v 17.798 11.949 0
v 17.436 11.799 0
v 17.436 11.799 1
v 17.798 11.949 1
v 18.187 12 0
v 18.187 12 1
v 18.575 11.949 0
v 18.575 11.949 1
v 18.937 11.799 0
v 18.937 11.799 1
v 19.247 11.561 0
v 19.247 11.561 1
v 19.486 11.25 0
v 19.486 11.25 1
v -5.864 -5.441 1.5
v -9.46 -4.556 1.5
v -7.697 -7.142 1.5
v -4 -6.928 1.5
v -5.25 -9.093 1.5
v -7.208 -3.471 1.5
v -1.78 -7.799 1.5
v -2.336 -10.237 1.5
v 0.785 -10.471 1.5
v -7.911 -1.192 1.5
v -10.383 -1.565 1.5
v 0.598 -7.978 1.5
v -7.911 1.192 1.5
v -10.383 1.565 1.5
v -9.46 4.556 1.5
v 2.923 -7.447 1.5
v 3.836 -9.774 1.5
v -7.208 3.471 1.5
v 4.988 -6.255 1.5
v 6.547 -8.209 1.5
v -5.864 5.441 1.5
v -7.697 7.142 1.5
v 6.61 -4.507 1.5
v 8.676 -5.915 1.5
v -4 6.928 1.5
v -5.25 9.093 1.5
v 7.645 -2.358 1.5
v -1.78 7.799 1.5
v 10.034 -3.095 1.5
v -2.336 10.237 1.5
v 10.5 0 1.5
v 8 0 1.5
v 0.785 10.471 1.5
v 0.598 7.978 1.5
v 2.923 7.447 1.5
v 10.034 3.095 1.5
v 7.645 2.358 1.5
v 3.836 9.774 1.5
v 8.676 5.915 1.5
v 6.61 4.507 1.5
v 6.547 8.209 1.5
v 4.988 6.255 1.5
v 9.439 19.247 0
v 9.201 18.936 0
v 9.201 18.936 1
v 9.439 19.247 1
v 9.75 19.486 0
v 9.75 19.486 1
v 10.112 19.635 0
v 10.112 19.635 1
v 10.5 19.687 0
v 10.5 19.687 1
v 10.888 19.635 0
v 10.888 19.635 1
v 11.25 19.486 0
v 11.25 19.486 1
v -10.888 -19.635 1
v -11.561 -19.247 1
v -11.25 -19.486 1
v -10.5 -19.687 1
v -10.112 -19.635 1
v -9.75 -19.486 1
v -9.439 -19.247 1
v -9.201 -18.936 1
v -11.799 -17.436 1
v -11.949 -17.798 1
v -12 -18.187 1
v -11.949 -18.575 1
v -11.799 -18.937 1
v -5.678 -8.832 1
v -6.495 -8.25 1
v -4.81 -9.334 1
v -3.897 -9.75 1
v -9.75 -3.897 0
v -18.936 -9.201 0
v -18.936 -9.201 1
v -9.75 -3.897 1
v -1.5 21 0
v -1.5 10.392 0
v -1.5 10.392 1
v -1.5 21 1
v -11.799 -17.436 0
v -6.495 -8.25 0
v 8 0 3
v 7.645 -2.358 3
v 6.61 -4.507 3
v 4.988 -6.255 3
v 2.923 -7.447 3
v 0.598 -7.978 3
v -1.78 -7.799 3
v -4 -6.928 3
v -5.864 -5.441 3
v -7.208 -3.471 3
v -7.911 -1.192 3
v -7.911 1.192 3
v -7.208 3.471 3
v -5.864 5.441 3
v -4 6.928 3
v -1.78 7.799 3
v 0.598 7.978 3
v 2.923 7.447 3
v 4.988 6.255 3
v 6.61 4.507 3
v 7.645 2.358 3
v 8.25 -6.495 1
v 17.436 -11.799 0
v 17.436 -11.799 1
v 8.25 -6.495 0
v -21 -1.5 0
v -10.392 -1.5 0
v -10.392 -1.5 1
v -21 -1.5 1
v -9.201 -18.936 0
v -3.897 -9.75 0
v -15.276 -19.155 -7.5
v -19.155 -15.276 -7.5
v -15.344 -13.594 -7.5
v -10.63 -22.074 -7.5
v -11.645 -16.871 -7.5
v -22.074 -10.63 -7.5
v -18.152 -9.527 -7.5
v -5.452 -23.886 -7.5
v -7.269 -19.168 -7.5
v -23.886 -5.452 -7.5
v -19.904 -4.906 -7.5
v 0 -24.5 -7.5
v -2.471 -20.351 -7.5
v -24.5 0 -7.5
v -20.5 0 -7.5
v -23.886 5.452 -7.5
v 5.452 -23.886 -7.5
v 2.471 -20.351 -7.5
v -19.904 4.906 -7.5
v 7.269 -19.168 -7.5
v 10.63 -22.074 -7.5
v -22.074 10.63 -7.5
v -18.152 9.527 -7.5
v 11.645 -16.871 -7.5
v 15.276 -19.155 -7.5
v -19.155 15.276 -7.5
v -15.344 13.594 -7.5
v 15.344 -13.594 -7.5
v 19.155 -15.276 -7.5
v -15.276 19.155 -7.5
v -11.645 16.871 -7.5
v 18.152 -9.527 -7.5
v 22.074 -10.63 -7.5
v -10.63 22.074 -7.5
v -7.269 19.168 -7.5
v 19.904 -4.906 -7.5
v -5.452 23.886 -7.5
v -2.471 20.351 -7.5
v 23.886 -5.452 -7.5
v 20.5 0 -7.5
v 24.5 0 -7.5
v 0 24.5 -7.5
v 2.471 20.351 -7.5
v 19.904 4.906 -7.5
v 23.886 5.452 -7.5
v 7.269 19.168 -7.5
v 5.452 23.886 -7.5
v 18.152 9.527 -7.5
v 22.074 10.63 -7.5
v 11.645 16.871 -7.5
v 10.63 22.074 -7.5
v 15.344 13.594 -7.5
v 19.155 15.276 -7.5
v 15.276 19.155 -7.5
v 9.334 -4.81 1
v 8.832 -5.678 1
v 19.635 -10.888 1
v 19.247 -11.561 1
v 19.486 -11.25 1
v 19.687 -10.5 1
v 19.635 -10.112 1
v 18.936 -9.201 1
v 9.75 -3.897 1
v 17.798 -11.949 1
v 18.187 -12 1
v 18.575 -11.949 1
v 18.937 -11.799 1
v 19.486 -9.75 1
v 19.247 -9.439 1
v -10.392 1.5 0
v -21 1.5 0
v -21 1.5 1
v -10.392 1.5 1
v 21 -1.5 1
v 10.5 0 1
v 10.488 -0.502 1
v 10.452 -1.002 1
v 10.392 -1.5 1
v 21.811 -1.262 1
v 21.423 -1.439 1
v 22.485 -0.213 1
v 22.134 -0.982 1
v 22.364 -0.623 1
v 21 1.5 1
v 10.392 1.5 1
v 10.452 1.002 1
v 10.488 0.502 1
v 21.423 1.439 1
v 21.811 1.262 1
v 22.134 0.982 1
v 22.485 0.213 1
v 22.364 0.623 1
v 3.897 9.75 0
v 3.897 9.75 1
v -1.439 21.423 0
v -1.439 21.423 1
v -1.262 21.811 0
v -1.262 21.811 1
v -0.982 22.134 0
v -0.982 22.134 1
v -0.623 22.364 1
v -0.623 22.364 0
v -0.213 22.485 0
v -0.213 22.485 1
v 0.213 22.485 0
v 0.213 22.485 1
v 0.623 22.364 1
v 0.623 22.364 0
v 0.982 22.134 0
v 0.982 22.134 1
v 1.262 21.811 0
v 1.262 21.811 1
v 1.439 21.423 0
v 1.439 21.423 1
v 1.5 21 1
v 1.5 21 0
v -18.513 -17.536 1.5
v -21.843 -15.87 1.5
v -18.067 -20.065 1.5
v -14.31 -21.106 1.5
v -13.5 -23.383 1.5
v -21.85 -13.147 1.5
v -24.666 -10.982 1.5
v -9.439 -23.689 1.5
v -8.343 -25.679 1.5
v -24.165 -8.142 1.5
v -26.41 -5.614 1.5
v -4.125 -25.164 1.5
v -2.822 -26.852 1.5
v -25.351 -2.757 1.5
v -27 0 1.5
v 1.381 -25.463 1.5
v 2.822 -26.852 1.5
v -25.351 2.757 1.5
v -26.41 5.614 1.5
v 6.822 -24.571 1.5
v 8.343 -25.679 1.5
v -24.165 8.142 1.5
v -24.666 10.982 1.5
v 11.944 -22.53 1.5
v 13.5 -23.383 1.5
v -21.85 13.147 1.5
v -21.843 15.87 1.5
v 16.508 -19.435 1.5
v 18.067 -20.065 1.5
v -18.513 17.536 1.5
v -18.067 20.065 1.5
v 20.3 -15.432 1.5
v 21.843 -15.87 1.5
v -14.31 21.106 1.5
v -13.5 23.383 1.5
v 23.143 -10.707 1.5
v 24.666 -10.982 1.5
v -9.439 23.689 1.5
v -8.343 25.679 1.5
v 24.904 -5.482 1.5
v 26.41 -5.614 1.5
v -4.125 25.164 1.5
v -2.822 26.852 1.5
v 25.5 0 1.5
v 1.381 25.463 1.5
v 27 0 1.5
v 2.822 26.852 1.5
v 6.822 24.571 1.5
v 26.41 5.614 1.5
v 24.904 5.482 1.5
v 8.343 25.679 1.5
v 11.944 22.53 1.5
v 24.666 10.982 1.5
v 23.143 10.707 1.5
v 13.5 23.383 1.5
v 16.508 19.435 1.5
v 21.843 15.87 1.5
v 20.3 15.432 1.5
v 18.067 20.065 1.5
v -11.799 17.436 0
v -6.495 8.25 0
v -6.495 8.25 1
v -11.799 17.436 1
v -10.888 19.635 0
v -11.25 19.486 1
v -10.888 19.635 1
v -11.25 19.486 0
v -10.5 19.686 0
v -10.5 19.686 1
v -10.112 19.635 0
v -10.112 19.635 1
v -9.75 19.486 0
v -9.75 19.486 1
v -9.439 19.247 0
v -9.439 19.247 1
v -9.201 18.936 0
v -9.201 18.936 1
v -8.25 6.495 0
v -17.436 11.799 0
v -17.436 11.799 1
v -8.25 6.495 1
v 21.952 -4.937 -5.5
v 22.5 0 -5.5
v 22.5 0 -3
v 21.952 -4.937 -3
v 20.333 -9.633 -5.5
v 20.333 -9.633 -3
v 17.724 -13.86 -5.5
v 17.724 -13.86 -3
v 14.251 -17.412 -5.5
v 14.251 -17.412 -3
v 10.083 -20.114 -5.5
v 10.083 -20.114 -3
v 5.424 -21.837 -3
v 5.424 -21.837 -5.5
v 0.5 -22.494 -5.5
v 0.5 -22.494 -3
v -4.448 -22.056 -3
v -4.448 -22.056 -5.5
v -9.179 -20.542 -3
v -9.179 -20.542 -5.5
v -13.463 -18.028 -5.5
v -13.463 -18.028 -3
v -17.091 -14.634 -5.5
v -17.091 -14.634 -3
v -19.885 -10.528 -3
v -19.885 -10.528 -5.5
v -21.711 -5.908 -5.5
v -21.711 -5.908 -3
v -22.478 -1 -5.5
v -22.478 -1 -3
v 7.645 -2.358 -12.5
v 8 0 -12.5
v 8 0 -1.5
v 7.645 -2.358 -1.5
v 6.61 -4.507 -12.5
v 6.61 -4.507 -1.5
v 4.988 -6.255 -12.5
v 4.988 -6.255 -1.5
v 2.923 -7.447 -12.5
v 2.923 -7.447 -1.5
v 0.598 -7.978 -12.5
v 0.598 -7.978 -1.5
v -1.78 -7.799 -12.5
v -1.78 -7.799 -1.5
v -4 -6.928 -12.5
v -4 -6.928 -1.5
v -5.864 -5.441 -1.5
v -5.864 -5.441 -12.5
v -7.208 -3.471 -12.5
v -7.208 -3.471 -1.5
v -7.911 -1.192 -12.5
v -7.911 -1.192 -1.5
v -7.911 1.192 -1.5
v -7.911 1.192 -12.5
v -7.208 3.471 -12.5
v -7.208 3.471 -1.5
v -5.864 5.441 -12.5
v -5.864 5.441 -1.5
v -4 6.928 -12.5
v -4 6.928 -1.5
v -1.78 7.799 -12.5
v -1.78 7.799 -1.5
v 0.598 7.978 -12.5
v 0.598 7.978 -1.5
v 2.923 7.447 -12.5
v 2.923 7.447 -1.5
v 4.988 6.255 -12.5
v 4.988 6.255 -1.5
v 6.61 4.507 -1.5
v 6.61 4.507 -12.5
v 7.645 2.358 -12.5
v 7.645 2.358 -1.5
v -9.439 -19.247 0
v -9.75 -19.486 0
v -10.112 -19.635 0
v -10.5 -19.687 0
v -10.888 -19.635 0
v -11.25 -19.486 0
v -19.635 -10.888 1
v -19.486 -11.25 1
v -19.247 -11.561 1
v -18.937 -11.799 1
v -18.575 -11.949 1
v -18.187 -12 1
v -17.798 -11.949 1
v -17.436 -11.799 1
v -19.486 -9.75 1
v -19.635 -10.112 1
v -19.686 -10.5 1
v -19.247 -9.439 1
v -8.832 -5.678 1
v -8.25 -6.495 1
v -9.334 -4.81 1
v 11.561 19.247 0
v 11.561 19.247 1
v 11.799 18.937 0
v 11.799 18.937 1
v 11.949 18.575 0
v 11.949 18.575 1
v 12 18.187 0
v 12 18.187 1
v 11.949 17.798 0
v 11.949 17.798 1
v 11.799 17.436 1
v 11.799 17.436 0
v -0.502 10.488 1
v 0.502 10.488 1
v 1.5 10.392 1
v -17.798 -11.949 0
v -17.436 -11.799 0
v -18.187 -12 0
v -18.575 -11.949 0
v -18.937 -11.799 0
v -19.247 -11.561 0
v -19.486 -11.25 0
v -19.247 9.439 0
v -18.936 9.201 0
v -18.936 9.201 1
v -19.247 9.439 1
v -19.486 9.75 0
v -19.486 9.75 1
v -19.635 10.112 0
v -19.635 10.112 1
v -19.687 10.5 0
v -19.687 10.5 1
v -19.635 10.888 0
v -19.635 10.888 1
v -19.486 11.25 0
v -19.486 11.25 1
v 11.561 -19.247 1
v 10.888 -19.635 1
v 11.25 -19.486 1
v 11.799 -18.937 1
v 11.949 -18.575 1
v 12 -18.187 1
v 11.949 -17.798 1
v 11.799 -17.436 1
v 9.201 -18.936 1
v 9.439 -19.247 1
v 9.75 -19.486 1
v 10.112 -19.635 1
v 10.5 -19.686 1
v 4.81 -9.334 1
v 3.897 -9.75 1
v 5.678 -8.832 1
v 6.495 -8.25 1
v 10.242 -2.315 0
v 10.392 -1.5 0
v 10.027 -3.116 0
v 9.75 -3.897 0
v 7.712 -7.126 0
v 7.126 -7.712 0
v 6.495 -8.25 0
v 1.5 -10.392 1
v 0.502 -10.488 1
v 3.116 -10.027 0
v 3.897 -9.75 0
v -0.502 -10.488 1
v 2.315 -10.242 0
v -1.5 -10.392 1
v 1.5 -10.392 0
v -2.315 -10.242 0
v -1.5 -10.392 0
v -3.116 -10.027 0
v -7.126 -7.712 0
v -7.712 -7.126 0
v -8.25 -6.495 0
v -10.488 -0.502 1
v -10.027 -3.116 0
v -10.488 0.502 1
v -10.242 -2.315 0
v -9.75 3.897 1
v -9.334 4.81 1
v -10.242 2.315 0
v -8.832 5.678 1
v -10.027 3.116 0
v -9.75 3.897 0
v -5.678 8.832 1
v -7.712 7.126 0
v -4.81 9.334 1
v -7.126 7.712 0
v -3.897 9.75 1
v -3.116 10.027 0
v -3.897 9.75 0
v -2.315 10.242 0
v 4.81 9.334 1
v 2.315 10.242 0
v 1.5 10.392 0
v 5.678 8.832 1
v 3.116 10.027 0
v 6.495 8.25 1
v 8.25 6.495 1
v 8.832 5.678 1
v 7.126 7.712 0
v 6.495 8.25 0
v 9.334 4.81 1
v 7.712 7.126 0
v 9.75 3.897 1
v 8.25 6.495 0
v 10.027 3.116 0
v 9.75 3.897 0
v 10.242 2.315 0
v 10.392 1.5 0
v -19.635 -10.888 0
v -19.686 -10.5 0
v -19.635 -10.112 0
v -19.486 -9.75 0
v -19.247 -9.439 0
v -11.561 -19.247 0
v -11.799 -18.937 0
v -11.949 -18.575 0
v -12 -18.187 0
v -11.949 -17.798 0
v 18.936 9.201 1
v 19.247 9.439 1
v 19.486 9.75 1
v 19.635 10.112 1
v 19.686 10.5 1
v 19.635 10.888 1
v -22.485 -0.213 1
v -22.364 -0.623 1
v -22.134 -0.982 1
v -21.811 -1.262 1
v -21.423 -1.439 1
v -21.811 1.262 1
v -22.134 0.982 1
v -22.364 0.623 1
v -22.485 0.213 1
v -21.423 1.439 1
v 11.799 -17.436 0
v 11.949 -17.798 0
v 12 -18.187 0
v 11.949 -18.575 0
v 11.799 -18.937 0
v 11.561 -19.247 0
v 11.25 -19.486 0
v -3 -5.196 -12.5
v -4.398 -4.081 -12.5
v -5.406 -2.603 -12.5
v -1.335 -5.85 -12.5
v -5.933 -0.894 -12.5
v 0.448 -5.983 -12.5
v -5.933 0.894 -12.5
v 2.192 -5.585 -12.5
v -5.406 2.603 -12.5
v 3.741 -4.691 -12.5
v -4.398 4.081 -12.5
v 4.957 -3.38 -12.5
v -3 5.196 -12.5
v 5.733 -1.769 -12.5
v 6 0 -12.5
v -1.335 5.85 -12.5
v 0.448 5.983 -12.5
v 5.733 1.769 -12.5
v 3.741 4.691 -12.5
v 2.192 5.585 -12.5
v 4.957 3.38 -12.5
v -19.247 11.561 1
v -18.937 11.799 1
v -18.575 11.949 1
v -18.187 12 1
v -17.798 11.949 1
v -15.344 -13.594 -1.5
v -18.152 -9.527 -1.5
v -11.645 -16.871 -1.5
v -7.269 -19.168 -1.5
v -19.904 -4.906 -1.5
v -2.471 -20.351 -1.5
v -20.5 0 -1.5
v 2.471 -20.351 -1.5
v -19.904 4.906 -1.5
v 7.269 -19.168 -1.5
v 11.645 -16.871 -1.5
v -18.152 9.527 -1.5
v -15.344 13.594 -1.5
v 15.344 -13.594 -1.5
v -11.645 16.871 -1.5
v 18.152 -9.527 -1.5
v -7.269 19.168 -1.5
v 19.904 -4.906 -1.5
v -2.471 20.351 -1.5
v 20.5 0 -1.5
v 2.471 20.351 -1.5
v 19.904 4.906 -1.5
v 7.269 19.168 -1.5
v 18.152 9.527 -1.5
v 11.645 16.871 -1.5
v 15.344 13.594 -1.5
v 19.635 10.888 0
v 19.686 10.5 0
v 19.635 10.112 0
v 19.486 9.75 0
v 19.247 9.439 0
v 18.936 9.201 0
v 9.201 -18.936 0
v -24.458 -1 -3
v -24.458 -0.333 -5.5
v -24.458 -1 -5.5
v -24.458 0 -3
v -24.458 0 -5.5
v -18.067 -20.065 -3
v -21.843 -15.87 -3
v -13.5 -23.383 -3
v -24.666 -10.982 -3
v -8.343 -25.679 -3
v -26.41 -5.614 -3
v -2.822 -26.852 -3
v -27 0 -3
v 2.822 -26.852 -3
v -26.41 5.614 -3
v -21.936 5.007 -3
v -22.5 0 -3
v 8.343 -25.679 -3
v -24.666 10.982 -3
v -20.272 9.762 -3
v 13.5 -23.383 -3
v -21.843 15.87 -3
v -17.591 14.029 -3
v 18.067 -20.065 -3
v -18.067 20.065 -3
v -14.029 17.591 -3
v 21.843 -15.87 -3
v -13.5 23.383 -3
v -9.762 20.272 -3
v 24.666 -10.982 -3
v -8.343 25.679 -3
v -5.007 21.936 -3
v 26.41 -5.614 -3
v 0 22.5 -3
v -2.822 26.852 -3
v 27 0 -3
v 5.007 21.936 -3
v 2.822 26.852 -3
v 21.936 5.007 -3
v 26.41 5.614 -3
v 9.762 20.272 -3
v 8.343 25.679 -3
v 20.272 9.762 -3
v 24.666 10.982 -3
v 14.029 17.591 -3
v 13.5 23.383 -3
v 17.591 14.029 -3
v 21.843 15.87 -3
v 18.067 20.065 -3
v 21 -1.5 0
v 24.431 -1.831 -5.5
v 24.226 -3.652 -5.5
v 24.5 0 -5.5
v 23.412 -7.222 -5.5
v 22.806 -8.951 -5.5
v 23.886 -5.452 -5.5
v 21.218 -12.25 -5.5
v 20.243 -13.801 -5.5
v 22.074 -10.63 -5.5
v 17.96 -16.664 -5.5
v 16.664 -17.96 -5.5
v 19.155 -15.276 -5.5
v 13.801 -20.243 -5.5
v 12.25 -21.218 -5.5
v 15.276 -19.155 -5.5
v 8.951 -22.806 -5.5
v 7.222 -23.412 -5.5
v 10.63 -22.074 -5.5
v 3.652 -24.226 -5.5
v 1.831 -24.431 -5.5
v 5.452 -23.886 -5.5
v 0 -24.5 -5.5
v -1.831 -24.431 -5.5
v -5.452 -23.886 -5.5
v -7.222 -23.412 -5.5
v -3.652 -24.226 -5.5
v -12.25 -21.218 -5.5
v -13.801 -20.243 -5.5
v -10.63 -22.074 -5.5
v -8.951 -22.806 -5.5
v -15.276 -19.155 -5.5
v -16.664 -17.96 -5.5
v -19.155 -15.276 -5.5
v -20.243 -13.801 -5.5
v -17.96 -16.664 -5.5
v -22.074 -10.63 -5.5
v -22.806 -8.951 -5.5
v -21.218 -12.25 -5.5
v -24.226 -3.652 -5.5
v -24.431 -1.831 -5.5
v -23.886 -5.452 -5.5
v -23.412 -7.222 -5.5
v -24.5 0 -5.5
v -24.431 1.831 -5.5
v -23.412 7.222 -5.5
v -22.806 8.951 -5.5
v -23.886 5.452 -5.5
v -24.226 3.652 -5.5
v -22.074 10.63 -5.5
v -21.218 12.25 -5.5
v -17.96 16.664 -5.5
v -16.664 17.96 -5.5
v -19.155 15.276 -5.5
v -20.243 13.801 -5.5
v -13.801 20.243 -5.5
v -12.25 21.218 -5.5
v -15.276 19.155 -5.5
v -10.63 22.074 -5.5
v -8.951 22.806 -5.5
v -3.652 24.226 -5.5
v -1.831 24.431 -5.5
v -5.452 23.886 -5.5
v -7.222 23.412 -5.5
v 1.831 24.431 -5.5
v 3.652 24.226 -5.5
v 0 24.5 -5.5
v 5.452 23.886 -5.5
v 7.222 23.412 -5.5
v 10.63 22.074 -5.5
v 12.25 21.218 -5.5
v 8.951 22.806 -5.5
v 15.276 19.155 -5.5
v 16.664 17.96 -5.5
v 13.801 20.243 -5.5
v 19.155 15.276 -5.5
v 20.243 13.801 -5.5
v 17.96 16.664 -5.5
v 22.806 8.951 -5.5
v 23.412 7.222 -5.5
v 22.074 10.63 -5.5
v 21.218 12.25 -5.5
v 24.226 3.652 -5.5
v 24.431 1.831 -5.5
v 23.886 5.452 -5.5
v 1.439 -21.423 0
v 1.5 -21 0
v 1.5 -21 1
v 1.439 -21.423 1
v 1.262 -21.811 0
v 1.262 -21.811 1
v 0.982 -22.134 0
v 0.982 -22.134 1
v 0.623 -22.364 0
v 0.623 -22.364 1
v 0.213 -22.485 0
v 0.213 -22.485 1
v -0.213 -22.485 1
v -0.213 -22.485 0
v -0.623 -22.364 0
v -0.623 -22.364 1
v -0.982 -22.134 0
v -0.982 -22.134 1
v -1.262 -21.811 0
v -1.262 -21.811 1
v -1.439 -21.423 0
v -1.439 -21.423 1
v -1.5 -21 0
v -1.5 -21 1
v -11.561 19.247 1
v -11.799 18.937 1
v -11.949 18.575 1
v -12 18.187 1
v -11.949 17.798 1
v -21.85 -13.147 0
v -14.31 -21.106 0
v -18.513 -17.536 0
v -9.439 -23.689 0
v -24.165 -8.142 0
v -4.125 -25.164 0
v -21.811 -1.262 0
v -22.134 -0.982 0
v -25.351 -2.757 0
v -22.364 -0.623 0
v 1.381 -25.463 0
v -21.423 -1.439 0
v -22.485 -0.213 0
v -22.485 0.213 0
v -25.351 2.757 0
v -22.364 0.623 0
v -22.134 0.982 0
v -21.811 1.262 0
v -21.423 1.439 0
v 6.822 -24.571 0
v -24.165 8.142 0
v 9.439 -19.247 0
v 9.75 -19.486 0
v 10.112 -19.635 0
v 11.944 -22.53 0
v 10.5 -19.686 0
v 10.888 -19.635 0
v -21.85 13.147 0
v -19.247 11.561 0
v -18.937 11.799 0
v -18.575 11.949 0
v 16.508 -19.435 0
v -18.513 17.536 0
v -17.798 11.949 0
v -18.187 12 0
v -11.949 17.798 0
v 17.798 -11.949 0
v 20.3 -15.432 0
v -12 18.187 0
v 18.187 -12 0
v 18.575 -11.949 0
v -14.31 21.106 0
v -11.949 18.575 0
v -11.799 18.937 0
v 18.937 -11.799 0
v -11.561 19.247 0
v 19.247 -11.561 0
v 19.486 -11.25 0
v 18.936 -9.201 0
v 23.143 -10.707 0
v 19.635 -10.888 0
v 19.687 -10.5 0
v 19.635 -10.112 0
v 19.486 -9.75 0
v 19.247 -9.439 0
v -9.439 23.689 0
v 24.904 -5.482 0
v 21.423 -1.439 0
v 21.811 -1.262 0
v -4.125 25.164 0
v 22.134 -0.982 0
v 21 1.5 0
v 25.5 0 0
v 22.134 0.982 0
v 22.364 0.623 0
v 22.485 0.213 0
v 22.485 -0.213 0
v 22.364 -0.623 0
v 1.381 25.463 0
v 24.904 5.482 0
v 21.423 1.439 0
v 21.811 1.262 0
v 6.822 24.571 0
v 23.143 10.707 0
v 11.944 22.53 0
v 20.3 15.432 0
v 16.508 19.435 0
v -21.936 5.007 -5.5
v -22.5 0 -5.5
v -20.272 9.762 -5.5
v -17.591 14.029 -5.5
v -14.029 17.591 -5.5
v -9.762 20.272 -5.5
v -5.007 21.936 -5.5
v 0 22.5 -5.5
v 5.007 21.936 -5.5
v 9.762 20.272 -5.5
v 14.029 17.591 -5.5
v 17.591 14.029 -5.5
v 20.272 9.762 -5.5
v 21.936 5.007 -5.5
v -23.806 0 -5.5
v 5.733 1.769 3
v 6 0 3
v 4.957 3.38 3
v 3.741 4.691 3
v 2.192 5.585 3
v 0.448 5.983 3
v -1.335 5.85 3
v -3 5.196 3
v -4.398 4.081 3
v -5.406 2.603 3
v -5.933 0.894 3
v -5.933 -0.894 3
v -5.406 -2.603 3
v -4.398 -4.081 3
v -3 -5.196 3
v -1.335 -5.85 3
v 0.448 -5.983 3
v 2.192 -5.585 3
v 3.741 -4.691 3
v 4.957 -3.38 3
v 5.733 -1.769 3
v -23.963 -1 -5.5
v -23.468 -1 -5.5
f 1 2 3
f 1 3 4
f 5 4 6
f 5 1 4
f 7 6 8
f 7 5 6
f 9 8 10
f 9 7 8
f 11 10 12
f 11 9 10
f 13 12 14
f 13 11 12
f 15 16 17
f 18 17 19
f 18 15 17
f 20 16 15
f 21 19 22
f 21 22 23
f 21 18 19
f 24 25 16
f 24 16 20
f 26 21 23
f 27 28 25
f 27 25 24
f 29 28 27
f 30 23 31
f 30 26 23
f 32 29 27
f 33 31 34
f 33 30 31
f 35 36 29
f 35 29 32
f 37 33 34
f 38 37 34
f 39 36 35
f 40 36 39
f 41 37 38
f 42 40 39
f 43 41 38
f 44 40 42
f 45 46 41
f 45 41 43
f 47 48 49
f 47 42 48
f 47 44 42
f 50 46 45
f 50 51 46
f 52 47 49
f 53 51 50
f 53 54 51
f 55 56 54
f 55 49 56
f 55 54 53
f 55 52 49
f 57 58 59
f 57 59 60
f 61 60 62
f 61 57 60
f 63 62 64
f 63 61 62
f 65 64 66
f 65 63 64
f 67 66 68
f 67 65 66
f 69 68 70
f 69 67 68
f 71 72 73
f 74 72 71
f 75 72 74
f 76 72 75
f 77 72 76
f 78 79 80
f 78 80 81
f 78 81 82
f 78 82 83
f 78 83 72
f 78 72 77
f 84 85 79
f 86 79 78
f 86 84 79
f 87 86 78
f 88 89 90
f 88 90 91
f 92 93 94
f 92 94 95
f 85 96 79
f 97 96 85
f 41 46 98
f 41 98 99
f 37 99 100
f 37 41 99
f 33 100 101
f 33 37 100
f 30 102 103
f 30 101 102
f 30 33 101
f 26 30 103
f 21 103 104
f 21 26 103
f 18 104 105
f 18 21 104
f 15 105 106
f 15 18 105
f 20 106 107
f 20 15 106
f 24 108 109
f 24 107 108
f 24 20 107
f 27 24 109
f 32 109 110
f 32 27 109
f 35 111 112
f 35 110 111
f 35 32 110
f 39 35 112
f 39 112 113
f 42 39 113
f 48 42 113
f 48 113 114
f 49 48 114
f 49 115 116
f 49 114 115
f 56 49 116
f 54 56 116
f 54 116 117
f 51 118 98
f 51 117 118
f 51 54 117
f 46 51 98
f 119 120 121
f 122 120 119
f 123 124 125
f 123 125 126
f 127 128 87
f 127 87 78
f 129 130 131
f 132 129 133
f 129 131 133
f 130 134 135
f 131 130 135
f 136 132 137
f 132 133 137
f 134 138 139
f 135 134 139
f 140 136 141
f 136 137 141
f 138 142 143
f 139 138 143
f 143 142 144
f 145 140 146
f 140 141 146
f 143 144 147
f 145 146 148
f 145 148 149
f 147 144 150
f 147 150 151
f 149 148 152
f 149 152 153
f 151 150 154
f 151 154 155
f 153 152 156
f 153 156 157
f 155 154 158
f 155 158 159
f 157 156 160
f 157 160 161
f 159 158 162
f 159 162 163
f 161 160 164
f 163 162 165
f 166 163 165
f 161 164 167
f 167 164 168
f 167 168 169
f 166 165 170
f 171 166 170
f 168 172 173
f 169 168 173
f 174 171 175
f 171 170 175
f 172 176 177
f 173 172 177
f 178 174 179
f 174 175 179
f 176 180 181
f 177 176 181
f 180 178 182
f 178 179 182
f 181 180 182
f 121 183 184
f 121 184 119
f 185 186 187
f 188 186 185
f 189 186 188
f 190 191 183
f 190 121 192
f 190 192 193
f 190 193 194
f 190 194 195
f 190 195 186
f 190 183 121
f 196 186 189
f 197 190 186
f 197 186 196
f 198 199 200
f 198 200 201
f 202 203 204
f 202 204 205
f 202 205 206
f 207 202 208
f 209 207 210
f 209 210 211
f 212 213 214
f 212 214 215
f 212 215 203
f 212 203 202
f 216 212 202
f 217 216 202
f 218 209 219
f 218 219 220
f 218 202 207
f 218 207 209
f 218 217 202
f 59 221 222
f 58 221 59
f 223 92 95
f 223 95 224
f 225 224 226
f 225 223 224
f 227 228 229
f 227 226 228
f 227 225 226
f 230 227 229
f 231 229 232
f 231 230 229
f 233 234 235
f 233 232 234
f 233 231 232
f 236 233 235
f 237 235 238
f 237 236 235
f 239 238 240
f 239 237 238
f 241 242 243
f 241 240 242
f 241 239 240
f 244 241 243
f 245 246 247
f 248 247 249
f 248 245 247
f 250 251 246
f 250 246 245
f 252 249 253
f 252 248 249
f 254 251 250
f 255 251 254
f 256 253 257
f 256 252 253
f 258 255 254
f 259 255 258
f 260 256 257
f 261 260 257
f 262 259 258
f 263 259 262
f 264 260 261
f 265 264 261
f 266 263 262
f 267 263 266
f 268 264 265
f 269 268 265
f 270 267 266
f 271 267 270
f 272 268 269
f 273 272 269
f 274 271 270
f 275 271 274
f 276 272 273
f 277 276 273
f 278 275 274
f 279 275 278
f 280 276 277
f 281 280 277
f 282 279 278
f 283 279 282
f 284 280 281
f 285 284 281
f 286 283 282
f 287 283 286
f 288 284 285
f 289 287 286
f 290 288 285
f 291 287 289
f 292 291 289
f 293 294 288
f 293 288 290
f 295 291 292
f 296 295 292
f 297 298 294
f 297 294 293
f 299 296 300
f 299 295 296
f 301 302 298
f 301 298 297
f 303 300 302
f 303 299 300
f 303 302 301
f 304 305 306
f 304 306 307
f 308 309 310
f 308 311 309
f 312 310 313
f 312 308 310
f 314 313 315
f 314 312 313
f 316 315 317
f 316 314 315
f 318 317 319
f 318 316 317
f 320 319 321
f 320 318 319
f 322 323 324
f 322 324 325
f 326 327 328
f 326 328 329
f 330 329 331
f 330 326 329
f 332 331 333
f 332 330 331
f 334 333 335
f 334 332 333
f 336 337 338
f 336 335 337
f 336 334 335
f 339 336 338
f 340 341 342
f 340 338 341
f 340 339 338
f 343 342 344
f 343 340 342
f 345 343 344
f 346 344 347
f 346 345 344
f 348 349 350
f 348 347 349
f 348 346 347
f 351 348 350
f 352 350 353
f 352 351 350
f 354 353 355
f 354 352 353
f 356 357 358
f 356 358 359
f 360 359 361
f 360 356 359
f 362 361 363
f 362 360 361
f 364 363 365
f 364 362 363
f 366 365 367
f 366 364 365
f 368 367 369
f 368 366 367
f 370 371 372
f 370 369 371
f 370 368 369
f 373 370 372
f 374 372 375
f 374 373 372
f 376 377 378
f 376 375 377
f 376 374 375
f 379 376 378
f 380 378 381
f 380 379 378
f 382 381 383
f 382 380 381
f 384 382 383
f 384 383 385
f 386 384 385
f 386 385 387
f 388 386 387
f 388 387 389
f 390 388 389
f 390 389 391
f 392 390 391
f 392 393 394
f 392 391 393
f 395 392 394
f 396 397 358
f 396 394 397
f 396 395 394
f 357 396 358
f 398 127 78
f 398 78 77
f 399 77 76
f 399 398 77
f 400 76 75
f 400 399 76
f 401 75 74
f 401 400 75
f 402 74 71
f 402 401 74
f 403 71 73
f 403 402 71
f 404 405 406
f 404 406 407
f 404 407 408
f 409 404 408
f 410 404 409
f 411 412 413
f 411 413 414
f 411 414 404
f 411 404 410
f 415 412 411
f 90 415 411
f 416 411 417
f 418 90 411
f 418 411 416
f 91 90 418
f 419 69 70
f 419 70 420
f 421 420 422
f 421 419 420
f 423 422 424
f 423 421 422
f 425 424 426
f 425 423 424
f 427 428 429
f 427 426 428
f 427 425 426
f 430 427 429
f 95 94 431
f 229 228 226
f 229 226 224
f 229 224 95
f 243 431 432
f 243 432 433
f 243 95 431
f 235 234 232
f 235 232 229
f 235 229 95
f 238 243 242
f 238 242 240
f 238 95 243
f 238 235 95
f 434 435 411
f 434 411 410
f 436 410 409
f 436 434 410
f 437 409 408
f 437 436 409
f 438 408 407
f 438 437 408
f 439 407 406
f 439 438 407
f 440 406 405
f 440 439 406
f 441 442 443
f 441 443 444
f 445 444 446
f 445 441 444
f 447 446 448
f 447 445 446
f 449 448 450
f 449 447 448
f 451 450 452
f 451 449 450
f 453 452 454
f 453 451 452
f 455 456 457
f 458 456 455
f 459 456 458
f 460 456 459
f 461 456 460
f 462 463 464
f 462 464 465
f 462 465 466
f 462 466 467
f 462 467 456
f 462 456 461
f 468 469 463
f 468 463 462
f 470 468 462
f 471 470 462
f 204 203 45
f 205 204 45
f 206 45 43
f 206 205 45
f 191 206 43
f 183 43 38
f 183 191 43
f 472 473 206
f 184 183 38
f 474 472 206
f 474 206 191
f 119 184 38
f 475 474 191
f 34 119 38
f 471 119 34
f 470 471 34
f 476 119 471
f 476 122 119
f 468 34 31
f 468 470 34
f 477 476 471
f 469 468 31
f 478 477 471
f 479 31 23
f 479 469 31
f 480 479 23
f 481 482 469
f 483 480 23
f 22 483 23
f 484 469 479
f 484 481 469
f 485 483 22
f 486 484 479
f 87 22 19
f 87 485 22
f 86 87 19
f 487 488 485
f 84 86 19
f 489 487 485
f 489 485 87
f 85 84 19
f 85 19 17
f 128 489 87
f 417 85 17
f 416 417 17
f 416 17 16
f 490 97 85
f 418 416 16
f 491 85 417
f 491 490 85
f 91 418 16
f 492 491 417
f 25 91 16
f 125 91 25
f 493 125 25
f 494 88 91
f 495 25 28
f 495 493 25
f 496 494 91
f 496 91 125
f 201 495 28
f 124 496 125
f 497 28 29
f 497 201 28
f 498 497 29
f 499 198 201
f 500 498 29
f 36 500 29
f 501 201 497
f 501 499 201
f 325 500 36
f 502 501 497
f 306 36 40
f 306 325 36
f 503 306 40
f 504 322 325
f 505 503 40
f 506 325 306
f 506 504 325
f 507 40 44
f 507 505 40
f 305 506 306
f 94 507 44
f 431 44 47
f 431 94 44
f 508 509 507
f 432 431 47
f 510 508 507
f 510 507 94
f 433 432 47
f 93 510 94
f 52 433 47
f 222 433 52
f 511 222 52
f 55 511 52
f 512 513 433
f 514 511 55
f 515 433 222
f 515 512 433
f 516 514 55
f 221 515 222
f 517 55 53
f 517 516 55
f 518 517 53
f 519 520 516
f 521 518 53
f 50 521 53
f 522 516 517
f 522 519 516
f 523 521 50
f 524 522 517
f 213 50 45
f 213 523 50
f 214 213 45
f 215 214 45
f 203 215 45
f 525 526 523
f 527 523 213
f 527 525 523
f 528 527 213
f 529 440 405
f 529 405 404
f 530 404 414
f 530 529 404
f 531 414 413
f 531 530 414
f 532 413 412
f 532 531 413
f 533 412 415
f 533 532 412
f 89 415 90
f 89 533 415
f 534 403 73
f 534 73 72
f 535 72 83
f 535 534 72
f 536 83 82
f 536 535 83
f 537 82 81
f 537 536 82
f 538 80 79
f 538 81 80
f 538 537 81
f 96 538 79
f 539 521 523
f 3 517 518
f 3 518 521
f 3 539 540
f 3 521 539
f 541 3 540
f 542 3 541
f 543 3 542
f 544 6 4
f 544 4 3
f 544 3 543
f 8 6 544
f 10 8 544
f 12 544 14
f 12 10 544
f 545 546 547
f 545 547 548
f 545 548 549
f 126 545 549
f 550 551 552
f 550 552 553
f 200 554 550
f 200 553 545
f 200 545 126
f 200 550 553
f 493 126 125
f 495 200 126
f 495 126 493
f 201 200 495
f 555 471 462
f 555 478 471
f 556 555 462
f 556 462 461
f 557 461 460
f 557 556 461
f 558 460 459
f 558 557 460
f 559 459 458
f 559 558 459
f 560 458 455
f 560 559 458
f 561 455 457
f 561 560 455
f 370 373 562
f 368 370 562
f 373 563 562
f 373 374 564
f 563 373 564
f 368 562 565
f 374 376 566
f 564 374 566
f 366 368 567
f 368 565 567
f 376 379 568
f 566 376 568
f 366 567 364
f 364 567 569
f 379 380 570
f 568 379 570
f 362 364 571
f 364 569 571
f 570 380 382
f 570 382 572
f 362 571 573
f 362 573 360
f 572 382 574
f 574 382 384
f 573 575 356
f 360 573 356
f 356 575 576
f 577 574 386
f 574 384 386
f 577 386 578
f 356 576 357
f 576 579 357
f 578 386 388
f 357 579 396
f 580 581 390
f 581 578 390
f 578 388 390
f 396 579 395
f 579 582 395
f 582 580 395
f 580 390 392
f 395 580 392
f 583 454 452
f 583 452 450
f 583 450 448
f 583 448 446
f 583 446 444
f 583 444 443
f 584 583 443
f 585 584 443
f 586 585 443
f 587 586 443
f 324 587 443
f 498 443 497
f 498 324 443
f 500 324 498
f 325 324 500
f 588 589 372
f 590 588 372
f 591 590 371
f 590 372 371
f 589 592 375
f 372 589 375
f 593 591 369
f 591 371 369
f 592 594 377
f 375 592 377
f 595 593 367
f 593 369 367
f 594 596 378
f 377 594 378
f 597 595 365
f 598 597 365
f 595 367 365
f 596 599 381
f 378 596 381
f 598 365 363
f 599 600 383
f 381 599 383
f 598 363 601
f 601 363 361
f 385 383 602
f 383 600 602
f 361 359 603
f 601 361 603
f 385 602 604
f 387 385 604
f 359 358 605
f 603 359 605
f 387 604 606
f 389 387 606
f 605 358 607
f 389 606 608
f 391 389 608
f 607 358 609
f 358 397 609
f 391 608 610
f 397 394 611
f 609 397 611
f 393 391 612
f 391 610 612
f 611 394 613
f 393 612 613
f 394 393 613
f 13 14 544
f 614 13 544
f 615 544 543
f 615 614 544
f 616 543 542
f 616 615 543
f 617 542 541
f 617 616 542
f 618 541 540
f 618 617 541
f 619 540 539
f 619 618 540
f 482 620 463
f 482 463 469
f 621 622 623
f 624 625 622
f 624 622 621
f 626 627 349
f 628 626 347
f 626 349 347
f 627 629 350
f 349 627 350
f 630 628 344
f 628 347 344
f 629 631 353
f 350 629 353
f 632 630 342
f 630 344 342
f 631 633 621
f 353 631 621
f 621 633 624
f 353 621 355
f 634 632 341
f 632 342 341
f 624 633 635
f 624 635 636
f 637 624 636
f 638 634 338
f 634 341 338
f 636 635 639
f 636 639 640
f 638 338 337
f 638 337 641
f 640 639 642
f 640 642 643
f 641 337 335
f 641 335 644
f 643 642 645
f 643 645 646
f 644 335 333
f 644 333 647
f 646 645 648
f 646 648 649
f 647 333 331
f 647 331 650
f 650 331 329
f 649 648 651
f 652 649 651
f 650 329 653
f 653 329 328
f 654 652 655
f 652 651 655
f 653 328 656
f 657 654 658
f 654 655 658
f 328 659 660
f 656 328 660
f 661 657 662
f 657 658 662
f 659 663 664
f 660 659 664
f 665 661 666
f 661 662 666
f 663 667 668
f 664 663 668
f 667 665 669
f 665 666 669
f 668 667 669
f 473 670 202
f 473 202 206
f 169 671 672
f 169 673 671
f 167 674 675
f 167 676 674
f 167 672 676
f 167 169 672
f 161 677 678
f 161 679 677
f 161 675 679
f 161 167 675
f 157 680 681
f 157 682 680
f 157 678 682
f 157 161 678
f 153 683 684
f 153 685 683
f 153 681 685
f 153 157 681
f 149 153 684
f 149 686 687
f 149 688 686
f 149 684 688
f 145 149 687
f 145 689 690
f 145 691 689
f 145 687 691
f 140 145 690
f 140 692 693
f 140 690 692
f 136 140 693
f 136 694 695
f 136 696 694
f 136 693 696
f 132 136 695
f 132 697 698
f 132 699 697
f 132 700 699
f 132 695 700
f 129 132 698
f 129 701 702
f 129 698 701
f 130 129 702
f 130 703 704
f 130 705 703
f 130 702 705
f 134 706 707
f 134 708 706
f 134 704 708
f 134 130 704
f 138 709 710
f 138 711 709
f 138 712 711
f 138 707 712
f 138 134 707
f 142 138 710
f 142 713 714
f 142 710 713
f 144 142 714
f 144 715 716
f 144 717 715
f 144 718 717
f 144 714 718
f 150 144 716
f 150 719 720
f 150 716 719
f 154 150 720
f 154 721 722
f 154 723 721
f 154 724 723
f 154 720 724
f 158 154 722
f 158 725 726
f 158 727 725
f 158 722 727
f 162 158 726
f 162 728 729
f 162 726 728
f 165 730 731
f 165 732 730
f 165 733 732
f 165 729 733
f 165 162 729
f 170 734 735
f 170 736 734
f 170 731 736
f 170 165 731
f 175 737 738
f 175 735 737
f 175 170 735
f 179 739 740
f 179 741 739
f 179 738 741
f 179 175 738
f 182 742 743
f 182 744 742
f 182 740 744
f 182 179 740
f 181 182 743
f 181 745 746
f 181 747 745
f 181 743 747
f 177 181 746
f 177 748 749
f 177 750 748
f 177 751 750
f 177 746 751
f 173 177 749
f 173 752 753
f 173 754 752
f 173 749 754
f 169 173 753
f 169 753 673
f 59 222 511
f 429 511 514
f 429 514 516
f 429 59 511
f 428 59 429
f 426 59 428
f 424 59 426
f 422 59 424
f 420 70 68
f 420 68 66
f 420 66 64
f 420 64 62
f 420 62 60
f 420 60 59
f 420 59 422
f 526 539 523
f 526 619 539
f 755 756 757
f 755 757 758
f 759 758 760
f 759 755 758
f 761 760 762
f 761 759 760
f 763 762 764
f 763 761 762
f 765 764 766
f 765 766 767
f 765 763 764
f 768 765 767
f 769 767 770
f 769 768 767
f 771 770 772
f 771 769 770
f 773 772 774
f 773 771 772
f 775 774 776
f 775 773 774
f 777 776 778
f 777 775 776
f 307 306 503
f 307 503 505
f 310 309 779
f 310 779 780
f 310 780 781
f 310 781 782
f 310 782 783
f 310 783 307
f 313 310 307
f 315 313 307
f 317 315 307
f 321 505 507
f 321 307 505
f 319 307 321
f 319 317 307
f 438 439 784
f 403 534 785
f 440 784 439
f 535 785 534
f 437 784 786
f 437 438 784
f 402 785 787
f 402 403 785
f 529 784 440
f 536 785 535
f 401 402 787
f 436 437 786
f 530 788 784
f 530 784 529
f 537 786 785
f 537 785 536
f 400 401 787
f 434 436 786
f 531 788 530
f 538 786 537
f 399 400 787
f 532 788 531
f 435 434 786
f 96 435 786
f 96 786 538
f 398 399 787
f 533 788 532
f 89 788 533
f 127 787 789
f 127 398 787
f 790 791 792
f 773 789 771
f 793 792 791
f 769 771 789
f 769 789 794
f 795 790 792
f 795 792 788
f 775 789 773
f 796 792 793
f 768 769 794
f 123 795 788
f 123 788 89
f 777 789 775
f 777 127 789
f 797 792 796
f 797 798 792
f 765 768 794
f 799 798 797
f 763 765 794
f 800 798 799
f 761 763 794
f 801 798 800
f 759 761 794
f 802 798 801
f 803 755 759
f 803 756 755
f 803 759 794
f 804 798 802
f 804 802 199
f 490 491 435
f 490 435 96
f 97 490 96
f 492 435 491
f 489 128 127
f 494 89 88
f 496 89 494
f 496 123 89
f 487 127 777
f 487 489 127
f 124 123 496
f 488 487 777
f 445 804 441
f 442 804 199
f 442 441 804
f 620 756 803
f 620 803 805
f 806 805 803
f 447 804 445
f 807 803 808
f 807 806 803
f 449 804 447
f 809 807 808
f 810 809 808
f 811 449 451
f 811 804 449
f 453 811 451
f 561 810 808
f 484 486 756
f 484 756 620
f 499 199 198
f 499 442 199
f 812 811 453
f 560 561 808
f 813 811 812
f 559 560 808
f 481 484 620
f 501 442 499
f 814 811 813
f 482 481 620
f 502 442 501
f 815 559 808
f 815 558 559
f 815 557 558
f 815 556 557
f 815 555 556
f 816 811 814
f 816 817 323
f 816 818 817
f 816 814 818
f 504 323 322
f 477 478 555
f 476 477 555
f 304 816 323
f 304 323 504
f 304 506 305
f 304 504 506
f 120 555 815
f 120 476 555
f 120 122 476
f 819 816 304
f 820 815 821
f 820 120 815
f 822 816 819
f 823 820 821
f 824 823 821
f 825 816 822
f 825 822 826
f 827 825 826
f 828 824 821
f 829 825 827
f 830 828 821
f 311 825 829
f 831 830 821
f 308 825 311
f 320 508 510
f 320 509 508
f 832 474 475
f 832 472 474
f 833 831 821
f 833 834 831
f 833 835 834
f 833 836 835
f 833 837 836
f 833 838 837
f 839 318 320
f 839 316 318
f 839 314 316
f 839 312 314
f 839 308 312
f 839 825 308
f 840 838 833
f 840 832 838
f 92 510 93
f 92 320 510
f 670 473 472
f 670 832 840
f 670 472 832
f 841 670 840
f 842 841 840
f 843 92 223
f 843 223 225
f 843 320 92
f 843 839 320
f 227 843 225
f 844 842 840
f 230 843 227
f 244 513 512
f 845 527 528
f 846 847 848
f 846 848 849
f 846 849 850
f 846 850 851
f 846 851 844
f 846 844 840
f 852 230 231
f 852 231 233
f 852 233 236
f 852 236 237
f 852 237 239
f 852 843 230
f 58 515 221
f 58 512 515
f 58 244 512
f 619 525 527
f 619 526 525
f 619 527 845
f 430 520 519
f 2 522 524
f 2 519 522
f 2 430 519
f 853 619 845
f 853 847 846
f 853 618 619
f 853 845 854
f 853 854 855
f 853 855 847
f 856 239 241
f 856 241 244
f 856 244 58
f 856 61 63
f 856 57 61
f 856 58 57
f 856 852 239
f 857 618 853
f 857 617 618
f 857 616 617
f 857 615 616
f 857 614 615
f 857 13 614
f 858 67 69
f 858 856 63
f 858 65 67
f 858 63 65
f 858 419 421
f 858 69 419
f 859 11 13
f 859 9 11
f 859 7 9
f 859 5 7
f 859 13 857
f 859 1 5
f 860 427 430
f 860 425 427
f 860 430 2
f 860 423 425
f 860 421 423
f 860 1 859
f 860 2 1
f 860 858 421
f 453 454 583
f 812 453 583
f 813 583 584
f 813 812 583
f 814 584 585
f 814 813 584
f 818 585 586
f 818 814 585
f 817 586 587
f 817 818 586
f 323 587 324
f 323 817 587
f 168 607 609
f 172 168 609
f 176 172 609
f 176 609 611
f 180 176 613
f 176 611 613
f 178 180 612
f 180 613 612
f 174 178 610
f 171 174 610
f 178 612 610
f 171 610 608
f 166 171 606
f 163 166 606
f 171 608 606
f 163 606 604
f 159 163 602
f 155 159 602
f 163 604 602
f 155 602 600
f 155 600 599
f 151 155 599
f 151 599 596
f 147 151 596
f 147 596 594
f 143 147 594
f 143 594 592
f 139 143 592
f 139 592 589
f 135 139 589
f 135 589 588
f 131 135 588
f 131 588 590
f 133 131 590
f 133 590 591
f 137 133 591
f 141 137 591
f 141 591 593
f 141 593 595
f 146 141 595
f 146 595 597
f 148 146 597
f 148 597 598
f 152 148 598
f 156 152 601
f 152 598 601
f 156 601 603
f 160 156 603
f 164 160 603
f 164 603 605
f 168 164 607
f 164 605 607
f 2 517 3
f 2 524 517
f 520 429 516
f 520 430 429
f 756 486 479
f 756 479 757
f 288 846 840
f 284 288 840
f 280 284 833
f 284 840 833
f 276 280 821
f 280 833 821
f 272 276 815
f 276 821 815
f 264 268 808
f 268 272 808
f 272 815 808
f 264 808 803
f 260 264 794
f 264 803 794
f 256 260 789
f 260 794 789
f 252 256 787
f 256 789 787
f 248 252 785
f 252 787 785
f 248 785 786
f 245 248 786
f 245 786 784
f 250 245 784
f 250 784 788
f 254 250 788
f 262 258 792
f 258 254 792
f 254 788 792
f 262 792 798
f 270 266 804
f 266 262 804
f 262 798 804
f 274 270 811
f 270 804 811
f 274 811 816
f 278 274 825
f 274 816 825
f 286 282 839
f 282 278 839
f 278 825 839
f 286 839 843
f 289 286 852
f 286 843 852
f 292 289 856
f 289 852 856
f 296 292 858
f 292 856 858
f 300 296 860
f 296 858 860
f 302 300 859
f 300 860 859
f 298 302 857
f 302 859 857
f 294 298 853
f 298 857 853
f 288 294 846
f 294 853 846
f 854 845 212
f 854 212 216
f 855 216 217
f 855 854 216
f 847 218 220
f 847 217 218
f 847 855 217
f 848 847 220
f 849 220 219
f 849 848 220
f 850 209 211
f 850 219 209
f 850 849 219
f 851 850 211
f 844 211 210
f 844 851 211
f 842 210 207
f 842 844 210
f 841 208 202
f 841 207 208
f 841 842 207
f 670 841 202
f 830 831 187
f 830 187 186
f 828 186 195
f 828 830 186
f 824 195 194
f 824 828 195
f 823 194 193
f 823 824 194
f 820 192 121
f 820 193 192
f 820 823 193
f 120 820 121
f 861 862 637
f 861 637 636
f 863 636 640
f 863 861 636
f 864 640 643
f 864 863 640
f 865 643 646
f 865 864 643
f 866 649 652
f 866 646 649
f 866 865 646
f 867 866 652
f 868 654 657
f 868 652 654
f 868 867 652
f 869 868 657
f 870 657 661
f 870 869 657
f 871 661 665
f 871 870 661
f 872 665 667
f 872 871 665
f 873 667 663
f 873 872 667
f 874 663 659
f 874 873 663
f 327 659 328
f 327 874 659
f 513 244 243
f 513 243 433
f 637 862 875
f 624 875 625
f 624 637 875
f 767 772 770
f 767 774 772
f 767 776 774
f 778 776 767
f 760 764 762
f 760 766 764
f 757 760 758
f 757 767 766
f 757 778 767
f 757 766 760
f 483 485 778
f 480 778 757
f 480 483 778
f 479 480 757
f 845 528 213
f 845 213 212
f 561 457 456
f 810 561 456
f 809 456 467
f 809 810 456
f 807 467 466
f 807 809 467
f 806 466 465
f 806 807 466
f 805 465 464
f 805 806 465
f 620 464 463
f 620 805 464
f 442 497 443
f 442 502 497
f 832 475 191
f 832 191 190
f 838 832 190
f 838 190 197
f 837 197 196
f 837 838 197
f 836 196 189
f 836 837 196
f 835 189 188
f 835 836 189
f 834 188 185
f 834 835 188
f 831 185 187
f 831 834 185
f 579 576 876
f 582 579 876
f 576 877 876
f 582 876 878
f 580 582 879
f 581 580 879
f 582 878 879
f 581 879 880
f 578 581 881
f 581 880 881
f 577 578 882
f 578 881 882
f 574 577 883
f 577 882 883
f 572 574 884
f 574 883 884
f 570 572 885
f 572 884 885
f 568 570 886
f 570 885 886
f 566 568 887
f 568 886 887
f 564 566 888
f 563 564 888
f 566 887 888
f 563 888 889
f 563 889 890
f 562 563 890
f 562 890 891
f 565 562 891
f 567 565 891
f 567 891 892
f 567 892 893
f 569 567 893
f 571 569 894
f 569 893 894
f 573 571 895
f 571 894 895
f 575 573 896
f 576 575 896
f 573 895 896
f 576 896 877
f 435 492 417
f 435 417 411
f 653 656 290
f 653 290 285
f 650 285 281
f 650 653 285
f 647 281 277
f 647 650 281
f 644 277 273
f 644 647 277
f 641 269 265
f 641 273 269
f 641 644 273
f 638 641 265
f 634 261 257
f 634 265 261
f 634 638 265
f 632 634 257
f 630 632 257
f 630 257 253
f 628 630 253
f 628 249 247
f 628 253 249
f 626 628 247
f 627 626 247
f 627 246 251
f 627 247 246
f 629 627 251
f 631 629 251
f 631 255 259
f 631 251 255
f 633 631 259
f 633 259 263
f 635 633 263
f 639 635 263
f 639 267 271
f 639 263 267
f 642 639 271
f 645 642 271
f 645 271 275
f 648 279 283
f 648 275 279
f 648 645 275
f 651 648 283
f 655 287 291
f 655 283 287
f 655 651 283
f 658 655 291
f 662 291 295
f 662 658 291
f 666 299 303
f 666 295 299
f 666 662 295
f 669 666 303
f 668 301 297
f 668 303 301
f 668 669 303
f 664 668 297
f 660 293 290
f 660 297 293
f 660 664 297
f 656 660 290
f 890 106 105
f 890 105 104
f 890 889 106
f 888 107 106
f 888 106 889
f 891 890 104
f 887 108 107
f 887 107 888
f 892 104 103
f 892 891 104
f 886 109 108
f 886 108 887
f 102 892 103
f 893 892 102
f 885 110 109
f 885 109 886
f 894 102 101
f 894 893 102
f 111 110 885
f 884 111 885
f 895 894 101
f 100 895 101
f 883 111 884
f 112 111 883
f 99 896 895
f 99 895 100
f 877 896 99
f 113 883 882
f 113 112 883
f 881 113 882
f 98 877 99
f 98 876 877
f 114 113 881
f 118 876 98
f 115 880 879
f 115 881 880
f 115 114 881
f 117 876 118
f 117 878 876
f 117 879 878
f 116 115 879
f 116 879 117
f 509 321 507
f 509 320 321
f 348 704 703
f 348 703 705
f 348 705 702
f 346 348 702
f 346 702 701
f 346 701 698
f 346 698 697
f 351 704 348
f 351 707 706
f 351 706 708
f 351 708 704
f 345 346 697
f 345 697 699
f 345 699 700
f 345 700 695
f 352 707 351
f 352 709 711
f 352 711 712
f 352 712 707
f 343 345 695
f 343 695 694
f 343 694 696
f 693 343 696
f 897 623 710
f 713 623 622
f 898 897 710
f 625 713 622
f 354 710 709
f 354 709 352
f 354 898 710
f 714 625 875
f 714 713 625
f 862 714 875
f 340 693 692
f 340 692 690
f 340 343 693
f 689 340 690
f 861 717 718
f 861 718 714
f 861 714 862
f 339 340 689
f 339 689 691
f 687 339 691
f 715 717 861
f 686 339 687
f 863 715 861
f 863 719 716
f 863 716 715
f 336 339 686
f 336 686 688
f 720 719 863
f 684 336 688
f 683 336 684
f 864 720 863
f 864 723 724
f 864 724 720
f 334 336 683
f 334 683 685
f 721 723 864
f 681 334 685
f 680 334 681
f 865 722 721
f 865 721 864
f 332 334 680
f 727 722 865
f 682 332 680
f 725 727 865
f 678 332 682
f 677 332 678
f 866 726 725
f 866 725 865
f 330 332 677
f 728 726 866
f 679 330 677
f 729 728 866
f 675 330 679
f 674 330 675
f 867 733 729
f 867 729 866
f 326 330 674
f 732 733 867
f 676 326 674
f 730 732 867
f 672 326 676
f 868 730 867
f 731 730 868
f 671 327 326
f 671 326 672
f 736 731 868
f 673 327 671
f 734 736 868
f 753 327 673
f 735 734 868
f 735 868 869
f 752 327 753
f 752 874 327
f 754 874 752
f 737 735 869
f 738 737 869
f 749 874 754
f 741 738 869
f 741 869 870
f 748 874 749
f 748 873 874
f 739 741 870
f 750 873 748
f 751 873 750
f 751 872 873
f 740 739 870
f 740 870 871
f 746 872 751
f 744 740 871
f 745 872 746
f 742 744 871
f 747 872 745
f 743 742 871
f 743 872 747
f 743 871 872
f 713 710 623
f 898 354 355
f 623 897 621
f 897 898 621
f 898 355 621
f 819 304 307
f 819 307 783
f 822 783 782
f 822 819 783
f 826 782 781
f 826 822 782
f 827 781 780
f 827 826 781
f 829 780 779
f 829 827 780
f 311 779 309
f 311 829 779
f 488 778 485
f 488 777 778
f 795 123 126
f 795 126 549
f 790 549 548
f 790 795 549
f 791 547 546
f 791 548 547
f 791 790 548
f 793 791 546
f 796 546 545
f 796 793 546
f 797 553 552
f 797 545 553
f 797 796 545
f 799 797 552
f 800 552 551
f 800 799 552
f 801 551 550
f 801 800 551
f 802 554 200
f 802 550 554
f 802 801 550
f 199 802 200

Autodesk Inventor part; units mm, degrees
ref_plane "YZ Plane" through (0, 0, 0) normal (1, 0, 0) x (0, 1, 0)
ref_plane "XZ Plane" through (0, 0, 0) normal (0, 1, 0) x (-1, 0, 0)
ref_plane "XY Plane" through (0, 0, 0) normal (0, 0, 1) x (1, 0, 0)
sketch "Sketch1" plane through (0, 0, 0) normal (0, 1, 0) x (-1, 0, 0)
  line L0 (0, 0) -> (-27, 0)
  line L1 (-27, 0) -> (-27, -3)
  line L2 (-27, -3) -> (-22.5, -3)
  line L3 (-22.5, -3) -> (-22.5, -5.5)
  line L4 (-22.5, -5.5) -> (-24.5, -5.5)
  line L5 (-24.5, -5.5) -> (-24.5, -7.5)
  line L6 (-24.5, -7.5) -> (-20.5, -7.5)
  line L7 (-20.5, -7.5) -> (-20.5, -1.5)
  line L8 (-20.5, -1.5) -> (-8, -1.5)
  line L9 (-8, -1.5) -> (-8, -12.5)
  line L10 (-8, -12.5) -> (-6, -12.5)
  line L11 (-6, -12.5) -> (-6, 0)
  line L12 (-6, 0) -> (-6, 3)
  line L13 (-6, 3) -> (-8, 3)
  line L14 (-8, 3) -> (-8, 1.5)
  line L15 (-8, 1.5) -> (-9, 1.5)
  line L16 (-9, 1.5) -> (-10.5, 1.5)
  line L17 (-10.5, 1.5) -> (-10.5, 0)
  line L18 (-27, 0) -> (-27, 1.5)
  line L19 (-27, 1.5) -> (-25.5, 1.5)
  line L20 (-25.5, 1.5) -> (-25.5, 0)
  line L21 (0, -15.6) -> (0, 6.1) projected
  dimension "d0" = 27
  dimension "d1" = 3
  dimension "d2" = 4.5
  dimension "d3" = 2.5
  dimension "d4" = 2
  dimension "d5" = 2.5
  dimension "d6" = 4
  dimension "d7" = 2
  dimension "d8" = 1.5
  dimension "d9" = 8
  dimension "d10" = 3
  dimension "d11" = 2
  dimension "d12" = 1.5
  dimension "d13" = 1
  dimension "d14" = 1.5
  dimension "d15" = 1.5
  dimension "d16" = 5
revolve "Revolution1" add sketch "Sketch1" angle 360 about axis through (0, 0, -10) along (0, 0, 1)
sketch "Sketch2" plane through (0, 0, 0) normal (0, 0, 1) x (1, 0, 0)
  circle A0 centre (0, 0) radius 10.5 projected
  line L0 (9.5, 1.5) -> (21, 1.5)
  line L1 (22.5, 0) -> (22.5, 0)
  line L2 (21, -1.5) -> (9.5, -1.5)
  line L3 (9.5, -1.5) -> (9.5, 1.5)
  arc A1 (22.5, 0) -> (21, 1.5) centre (21, 0) ccw
  arc A2 (21, -1.5) -> (22.5, 0) centre (21, 0) ccw
  line L4 (7.4772, 6.049) -> (17.4365, 11.799)
  line L5 (19.4856, 11.25) -> (19.4856, 11.25)
  line L6 (18.9365, 9.201) -> (8.9772, 3.451)
  line L7 (8.9772, 3.451) -> (7.4772, 6.049)
  arc A3 (19.4856, 11.25) -> (17.4365, 11.799) centre (18.1865, 10.5) ccw
  arc A4 (18.9365, 9.201) -> (19.4856, 11.25) centre (18.1865, 10.5) ccw
  line L8 (3.451, 8.9772) -> (9.201, 18.9365)
  line L9 (11.25, 19.4856) -> (11.25, 19.4856)
  line L10 (11.799, 17.4365) -> (6.049, 7.4772)
  line L11 (6.049, 7.4772) -> (3.451, 8.9772)
  arc A5 (11.25, 19.4856) -> (9.201, 18.9365) centre (10.5, 18.1865) ccw
  arc A6 (11.799, 17.4365) -> (11.25, 19.4856) centre (10.5, 18.1865) ccw
  line L12 (-1.5, 9.5) -> (-1.5, 21)
  line L13 (0, 22.5) -> (0, 22.5)
  line L14 (1.5, 21) -> (1.5, 9.5)
  line L15 (1.5, 9.5) -> (-1.5, 9.5)
  arc A7 (0, 22.5) -> (-1.5, 21) centre (0, 21) ccw
  arc A8 (1.5, 21) -> (0, 22.5) centre (0, 21) ccw
  line L16 (-6.049, 7.4772) -> (-11.799, 17.4365)
  line L17 (-11.25, 19.4856) -> (-11.25, 19.4856)
  line L18 (-9.201, 18.9365) -> (-3.451, 8.9772)
  line L19 (-3.451, 8.9772) -> (-6.049, 7.4772)
  arc A9 (-11.25, 19.4856) -> (-11.799, 17.4365) centre (-10.5, 18.1865) ccw
  arc A10 (-9.201, 18.9365) -> (-11.25, 19.4856) centre (-10.5, 18.1865) ccw
  line L20 (-8.9772, 3.451) -> (-18.9365, 9.201)
  line L21 (-19.4856, 11.25) -> (-19.4856, 11.25)
  line L22 (-17.4365, 11.799) -> (-7.4772, 6.049)
  line L23 (-7.4772, 6.049) -> (-8.9772, 3.451)
  arc A11 (-19.4856, 11.25) -> (-18.9365, 9.201) centre (-18.1865, 10.5) ccw
  arc A12 (-17.4365, 11.799) -> (-19.4856, 11.25) centre (-18.1865, 10.5) ccw
  line L24 (-9.5, -1.5) -> (-21, -1.5)
  line L25 (-22.5, 0) -> (-22.5, 0)
  line L26 (-21, 1.5) -> (-9.5, 1.5)
  line L27 (-9.5, 1.5) -> (-9.5, -1.5)
  arc A13 (-22.5, 0) -> (-21, -1.5) centre (-21, 0) ccw
  arc A14 (-21, 1.5) -> (-22.5, 0) centre (-21, 0) ccw
  line L28 (-7.4772, -6.049) -> (-17.4365, -11.799)
  line L29 (-19.4856, -11.25) -> (-19.4856, -11.25)
  line L30 (-18.9365, -9.201) -> (-8.9772, -3.451)
  line L31 (-8.9772, -3.451) -> (-7.4772, -6.049)
  arc A15 (-19.4856, -11.25) -> (-17.4365, -11.799) centre (-18.1865, -10.5) ccw
  arc A16 (-18.9365, -9.201) -> (-19.4856, -11.25) centre (-18.1865, -10.5) ccw
  line L32 (-3.451, -8.9772) -> (-9.201, -18.9365)
  line L33 (-11.25, -19.4856) -> (-11.25, -19.4856)
  line L34 (-11.799, -17.4365) -> (-6.049, -7.4772)
  line L35 (-6.049, -7.4772) -> (-3.451, -8.9772)
  arc A17 (-11.25, -19.4856) -> (-9.201, -18.9365) centre (-10.5, -18.1865) ccw
  arc A18 (-11.799, -17.4365) -> (-11.25, -19.4856) centre (-10.5, -18.1865) ccw
  line L36 (1.5, -9.5) -> (1.5, -21)
  line L37 (0, -22.5) -> (0, -22.5)
  line L38 (-1.5, -21) -> (-1.5, -9.5)
  line L39 (-1.5, -9.5) -> (1.5, -9.5)
  arc A19 (0, -22.5) -> (1.5, -21) centre (0, -21) ccw
  arc A20 (-1.5, -21) -> (0, -22.5) centre (0, -21) ccw
  line L40 (6.049, -7.4772) -> (11.799, -17.4365)
  line L41 (11.25, -19.4856) -> (11.25, -19.4856)
  line L42 (9.201, -18.9365) -> (3.451, -8.9772)
  line L43 (3.451, -8.9772) -> (6.049, -7.4772)
  arc A21 (11.25, -19.4856) -> (11.799, -17.4365) centre (10.5, -18.1865) ccw
  arc A22 (9.201, -18.9365) -> (11.25, -19.4856) centre (10.5, -18.1865) ccw
  line L44 (8.9772, -3.451) -> (18.9365, -9.201)
  line L45 (19.4856, -11.25) -> (19.4856, -11.25)
  line L46 (17.4365, -11.799) -> (7.4772, -6.049)
  line L47 (7.4772, -6.049) -> (8.9772, -3.451)
  arc A23 (19.4856, -11.25) -> (18.9365, -9.201) centre (18.1865, -10.5) ccw
  arc A24 (17.4365, -11.799) -> (19.4856, -11.25) centre (18.1865, -10.5) ccw
  point P0 (22.5, -1.5)
  point P1 (20.2356, 9.951)
  point P2 (12.549, 18.7356)
  point P3 (1.5, 22.5)
  point P4 (-9.951, 20.2356)
  point P5 (-18.7356, 12.549)
  point P6 (-22.5, 1.5)
  point P7 (-20.2356, -9.951)
  point P8 (-12.549, -18.7356)
  point P9 (-1.5, -22.5)
  point P10 (9.951, -20.2356)
  point P11 (18.7356, -12.549)
  dimension "d18" = 13
  dimension "d19" = 1
  dimension "d20" = 3
  dimension "d21" = 1.5
  dimension "d22" = 1.5
  dimension "d25" = 360
extrude "Extrusion1" add sketch "Sketch2" along normal blind 1 contours A0 L2 L3 L0 | A0 L0 A1 A2 L2 | L6 L7 L4 A0 | A0 L4 A3 A4 L6 | L44 A23 A24 L46 A0 | A0 L46 L47 L44 | L10 L11 L8 A0 | A0 L8 A5 A6 L10 | L40 A21 A22 L42 A0 | A0 L42 L43 L40 | L14 L15 L12 A0 | A0 L12 A7 A8 L14 | L36 A19 A20 L38 A0 | A0 L38 L39 L36 | L18 L19 L16 A0 | A0 L16 A9 A10 L18 | L32 A17 A18 L34 A0 | A0 L34 L35 L32 | L22 L23 L20 A0 | A0 L20 A11 A12 L22 | L28 A15 A16 L30 A0 | A0 L30 L31 L28 | L26 L27 L24 A0 | A0 L24 A13 A14 L26
sketch "Sketch3" plane through (0, 0, 0) normal (0, 1, 0) x (-1, 0, 0)
  line L0 (24.5, -5.5) -> (-24.5, -5.5) projected
  line L1 (22.4583, -5.5) -> (24.4583, -5.5)
  line L2 (24.4583, -5.5) -> (24.4583, -3)
  line L3 (24.4583, -3) -> (22.4583, -3)
  line L4 (22.4583, -3) -> (22.4583, -5.5)
  point P0 (0, 0)
  dimension "d29" = 2
  dimension "d30" = 2.5
extrude "Extrusion2" add sketch "Sketch3" against normal blind 1
equation "\"d21\" = 0.5 * d20"
properties part number "MotorGrill"
